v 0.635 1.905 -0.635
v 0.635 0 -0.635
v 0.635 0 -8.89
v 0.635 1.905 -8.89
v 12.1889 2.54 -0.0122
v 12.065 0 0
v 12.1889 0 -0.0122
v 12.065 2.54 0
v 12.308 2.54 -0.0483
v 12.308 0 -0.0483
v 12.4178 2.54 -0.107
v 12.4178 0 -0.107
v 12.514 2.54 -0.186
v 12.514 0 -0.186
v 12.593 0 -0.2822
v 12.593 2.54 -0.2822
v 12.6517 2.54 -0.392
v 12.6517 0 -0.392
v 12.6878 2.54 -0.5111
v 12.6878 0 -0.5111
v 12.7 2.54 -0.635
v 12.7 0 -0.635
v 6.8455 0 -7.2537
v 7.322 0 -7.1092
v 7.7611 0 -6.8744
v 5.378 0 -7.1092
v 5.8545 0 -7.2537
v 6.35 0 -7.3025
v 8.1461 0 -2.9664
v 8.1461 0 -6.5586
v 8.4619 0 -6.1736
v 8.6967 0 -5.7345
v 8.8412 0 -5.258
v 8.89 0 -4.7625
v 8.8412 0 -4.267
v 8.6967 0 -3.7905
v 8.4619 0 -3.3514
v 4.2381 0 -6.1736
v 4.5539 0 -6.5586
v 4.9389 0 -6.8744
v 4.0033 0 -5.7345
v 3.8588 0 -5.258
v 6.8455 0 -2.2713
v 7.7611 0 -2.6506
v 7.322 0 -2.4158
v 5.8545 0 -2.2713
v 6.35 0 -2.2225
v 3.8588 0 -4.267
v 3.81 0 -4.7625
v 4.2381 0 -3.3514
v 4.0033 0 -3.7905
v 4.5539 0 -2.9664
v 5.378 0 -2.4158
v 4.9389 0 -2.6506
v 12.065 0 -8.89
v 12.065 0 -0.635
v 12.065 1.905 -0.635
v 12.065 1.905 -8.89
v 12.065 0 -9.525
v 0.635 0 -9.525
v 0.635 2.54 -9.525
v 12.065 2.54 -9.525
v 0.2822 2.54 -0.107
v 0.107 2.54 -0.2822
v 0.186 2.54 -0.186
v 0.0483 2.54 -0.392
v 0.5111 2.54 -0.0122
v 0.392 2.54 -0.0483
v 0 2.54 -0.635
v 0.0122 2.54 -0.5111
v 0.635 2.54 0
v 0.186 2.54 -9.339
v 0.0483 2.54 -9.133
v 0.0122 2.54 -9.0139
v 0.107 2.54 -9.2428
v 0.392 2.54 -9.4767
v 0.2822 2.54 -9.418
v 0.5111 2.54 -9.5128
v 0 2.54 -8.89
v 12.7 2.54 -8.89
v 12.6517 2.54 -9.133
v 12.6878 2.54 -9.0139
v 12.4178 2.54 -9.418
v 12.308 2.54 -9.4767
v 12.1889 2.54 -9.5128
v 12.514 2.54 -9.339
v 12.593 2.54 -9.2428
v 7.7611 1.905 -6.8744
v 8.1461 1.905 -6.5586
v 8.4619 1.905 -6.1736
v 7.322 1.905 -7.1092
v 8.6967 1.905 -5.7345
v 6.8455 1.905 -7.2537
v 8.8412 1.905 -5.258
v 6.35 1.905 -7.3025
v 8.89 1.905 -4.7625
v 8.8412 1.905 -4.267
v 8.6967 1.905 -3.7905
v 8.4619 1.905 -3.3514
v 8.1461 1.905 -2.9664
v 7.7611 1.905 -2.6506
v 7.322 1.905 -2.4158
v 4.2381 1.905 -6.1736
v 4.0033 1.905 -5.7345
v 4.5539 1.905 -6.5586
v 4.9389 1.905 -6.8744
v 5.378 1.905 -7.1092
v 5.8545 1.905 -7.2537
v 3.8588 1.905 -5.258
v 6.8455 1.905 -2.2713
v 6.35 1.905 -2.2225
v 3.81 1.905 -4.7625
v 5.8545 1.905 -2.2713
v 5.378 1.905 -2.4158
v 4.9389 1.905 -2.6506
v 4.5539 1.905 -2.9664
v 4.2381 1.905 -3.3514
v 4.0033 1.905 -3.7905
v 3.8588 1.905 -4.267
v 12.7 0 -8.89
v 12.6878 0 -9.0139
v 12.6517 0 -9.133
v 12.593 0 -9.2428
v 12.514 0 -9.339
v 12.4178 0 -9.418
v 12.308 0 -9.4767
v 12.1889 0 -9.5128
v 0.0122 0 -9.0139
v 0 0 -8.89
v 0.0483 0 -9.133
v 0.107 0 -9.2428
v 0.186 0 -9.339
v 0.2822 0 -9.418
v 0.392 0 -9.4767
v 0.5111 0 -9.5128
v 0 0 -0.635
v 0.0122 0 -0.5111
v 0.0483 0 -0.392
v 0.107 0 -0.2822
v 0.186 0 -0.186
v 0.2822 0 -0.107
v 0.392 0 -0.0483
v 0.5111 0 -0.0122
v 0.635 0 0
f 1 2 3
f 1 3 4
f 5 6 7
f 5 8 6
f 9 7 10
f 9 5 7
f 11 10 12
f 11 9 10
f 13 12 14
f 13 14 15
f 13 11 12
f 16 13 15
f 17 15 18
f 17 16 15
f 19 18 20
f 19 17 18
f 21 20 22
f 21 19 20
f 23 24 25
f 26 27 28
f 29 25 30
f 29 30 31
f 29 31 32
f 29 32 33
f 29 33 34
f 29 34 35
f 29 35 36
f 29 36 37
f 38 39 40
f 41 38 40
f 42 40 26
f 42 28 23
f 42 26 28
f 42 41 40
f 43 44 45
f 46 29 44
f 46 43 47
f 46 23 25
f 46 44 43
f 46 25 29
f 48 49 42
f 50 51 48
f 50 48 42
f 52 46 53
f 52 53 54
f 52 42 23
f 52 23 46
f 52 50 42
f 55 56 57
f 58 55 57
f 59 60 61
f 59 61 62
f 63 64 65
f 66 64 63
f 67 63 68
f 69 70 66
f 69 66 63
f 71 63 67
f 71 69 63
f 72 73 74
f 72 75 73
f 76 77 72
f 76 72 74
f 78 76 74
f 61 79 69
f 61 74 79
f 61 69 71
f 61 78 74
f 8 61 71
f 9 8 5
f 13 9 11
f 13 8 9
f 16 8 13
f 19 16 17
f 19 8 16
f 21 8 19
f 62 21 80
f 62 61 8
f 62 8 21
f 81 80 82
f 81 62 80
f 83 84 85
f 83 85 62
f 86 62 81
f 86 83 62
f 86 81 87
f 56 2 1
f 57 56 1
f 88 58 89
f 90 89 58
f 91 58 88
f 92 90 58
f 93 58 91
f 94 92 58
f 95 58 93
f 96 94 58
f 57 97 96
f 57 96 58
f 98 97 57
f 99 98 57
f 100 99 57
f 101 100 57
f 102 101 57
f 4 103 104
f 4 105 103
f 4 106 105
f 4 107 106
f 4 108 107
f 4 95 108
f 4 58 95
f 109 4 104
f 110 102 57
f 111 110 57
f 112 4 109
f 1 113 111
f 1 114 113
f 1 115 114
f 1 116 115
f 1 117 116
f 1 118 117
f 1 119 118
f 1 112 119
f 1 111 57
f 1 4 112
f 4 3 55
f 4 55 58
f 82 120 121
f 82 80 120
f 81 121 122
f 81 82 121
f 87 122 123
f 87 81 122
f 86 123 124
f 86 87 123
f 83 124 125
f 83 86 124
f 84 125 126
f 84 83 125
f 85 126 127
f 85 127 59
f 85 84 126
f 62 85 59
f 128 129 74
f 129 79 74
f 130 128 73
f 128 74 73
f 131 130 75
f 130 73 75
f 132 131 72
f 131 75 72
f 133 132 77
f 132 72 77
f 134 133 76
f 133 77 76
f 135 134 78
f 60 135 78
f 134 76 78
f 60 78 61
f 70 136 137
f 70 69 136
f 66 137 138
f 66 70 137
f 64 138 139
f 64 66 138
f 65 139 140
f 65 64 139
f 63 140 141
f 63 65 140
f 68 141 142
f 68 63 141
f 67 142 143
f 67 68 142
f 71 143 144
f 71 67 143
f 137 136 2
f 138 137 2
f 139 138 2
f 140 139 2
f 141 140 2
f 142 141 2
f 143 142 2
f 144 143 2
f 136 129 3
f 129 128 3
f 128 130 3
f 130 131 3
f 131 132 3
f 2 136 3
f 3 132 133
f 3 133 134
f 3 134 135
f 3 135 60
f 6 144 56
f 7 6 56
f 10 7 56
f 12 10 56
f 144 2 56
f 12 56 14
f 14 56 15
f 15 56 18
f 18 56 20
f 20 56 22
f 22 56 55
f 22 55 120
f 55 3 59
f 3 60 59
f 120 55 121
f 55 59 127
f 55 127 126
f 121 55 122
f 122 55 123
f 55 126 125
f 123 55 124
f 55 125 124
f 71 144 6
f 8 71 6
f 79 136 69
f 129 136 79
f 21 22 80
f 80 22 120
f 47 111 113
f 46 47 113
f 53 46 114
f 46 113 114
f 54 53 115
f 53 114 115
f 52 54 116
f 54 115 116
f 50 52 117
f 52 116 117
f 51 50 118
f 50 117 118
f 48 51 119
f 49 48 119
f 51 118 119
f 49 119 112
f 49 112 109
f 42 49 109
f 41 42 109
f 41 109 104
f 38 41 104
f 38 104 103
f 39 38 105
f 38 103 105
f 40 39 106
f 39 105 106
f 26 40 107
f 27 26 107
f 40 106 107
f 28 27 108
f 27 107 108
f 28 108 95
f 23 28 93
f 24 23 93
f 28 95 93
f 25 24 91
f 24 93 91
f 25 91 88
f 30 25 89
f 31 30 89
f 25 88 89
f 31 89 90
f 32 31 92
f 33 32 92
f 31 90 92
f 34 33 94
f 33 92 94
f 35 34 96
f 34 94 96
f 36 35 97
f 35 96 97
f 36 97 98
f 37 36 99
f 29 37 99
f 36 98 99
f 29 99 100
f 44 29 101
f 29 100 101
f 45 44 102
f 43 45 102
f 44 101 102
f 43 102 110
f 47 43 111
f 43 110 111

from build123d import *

# Parameters (mm, degrees)
SKETCH1_W           = 12.7
SKETCH1_H           = 9.525
BOSS_EXTRUDE1_DEPTH = 2.54
FILLET1_R           = 0.635
SHELL1_START        = 0.635
SHELL1_OUTLINE_W    = 1.905
SHELL1_OUTLINE_H    = 8.255
SHELL1_DEPTH        = 11.43
SKETCH2_R           = 2.54
BOSS_EXTRUDE2_DEPTH = 1.905


# Read off the part's stored shape, not the designer's step: Shell1
with BuildPart() as part:
    # Sketch1 → Boss-Extrude1 (new body)
    with BuildSketch(Plane(origin=(0, 0, 0), x_dir=(1, 0, 0), z_dir=(0, 1, 0))):
        with Locations((6.35, 4.7625)):
            Rectangle(SKETCH1_W, SKETCH1_H)
    extrude(amount=BOSS_EXTRUDE1_DEPTH)

    # Fillet1
    fillet1_edges = [part.edges().sort_by_distance(p)[0] for p in [
        (0, 1.27, -9.525),
        (12.7, 1.27, -9.525),
        (12.7, 1.27, 0),
        (0, 1.27, 0),
    ]]
    fillet(fillet1_edges, radius=FILLET1_R)

    # Shell1 outline → Shell1 (cut)
    with BuildSketch(Plane.YZ.offset(SHELL1_START)):
        with Locations((0.9525, -4.7625)):
            Rectangle(SHELL1_OUTLINE_W, SHELL1_OUTLINE_H)
    extrude(amount=SHELL1_DEPTH, mode=Mode.SUBTRACT)

    # Sketch2 → Boss-Extrude2 (add)
    with BuildSketch(Plane(origin=(0, 1.905, 0), x_dir=(-1, 0, 0), z_dir=(0, -1, 0))):
        with Locations(Location((-6.35, 4.7625, 0), (0, 0, 270))):
            Circle(SKETCH2_R)
    extrude(amount=BOSS_EXTRUDE2_DEPTH)


solid = part.part
